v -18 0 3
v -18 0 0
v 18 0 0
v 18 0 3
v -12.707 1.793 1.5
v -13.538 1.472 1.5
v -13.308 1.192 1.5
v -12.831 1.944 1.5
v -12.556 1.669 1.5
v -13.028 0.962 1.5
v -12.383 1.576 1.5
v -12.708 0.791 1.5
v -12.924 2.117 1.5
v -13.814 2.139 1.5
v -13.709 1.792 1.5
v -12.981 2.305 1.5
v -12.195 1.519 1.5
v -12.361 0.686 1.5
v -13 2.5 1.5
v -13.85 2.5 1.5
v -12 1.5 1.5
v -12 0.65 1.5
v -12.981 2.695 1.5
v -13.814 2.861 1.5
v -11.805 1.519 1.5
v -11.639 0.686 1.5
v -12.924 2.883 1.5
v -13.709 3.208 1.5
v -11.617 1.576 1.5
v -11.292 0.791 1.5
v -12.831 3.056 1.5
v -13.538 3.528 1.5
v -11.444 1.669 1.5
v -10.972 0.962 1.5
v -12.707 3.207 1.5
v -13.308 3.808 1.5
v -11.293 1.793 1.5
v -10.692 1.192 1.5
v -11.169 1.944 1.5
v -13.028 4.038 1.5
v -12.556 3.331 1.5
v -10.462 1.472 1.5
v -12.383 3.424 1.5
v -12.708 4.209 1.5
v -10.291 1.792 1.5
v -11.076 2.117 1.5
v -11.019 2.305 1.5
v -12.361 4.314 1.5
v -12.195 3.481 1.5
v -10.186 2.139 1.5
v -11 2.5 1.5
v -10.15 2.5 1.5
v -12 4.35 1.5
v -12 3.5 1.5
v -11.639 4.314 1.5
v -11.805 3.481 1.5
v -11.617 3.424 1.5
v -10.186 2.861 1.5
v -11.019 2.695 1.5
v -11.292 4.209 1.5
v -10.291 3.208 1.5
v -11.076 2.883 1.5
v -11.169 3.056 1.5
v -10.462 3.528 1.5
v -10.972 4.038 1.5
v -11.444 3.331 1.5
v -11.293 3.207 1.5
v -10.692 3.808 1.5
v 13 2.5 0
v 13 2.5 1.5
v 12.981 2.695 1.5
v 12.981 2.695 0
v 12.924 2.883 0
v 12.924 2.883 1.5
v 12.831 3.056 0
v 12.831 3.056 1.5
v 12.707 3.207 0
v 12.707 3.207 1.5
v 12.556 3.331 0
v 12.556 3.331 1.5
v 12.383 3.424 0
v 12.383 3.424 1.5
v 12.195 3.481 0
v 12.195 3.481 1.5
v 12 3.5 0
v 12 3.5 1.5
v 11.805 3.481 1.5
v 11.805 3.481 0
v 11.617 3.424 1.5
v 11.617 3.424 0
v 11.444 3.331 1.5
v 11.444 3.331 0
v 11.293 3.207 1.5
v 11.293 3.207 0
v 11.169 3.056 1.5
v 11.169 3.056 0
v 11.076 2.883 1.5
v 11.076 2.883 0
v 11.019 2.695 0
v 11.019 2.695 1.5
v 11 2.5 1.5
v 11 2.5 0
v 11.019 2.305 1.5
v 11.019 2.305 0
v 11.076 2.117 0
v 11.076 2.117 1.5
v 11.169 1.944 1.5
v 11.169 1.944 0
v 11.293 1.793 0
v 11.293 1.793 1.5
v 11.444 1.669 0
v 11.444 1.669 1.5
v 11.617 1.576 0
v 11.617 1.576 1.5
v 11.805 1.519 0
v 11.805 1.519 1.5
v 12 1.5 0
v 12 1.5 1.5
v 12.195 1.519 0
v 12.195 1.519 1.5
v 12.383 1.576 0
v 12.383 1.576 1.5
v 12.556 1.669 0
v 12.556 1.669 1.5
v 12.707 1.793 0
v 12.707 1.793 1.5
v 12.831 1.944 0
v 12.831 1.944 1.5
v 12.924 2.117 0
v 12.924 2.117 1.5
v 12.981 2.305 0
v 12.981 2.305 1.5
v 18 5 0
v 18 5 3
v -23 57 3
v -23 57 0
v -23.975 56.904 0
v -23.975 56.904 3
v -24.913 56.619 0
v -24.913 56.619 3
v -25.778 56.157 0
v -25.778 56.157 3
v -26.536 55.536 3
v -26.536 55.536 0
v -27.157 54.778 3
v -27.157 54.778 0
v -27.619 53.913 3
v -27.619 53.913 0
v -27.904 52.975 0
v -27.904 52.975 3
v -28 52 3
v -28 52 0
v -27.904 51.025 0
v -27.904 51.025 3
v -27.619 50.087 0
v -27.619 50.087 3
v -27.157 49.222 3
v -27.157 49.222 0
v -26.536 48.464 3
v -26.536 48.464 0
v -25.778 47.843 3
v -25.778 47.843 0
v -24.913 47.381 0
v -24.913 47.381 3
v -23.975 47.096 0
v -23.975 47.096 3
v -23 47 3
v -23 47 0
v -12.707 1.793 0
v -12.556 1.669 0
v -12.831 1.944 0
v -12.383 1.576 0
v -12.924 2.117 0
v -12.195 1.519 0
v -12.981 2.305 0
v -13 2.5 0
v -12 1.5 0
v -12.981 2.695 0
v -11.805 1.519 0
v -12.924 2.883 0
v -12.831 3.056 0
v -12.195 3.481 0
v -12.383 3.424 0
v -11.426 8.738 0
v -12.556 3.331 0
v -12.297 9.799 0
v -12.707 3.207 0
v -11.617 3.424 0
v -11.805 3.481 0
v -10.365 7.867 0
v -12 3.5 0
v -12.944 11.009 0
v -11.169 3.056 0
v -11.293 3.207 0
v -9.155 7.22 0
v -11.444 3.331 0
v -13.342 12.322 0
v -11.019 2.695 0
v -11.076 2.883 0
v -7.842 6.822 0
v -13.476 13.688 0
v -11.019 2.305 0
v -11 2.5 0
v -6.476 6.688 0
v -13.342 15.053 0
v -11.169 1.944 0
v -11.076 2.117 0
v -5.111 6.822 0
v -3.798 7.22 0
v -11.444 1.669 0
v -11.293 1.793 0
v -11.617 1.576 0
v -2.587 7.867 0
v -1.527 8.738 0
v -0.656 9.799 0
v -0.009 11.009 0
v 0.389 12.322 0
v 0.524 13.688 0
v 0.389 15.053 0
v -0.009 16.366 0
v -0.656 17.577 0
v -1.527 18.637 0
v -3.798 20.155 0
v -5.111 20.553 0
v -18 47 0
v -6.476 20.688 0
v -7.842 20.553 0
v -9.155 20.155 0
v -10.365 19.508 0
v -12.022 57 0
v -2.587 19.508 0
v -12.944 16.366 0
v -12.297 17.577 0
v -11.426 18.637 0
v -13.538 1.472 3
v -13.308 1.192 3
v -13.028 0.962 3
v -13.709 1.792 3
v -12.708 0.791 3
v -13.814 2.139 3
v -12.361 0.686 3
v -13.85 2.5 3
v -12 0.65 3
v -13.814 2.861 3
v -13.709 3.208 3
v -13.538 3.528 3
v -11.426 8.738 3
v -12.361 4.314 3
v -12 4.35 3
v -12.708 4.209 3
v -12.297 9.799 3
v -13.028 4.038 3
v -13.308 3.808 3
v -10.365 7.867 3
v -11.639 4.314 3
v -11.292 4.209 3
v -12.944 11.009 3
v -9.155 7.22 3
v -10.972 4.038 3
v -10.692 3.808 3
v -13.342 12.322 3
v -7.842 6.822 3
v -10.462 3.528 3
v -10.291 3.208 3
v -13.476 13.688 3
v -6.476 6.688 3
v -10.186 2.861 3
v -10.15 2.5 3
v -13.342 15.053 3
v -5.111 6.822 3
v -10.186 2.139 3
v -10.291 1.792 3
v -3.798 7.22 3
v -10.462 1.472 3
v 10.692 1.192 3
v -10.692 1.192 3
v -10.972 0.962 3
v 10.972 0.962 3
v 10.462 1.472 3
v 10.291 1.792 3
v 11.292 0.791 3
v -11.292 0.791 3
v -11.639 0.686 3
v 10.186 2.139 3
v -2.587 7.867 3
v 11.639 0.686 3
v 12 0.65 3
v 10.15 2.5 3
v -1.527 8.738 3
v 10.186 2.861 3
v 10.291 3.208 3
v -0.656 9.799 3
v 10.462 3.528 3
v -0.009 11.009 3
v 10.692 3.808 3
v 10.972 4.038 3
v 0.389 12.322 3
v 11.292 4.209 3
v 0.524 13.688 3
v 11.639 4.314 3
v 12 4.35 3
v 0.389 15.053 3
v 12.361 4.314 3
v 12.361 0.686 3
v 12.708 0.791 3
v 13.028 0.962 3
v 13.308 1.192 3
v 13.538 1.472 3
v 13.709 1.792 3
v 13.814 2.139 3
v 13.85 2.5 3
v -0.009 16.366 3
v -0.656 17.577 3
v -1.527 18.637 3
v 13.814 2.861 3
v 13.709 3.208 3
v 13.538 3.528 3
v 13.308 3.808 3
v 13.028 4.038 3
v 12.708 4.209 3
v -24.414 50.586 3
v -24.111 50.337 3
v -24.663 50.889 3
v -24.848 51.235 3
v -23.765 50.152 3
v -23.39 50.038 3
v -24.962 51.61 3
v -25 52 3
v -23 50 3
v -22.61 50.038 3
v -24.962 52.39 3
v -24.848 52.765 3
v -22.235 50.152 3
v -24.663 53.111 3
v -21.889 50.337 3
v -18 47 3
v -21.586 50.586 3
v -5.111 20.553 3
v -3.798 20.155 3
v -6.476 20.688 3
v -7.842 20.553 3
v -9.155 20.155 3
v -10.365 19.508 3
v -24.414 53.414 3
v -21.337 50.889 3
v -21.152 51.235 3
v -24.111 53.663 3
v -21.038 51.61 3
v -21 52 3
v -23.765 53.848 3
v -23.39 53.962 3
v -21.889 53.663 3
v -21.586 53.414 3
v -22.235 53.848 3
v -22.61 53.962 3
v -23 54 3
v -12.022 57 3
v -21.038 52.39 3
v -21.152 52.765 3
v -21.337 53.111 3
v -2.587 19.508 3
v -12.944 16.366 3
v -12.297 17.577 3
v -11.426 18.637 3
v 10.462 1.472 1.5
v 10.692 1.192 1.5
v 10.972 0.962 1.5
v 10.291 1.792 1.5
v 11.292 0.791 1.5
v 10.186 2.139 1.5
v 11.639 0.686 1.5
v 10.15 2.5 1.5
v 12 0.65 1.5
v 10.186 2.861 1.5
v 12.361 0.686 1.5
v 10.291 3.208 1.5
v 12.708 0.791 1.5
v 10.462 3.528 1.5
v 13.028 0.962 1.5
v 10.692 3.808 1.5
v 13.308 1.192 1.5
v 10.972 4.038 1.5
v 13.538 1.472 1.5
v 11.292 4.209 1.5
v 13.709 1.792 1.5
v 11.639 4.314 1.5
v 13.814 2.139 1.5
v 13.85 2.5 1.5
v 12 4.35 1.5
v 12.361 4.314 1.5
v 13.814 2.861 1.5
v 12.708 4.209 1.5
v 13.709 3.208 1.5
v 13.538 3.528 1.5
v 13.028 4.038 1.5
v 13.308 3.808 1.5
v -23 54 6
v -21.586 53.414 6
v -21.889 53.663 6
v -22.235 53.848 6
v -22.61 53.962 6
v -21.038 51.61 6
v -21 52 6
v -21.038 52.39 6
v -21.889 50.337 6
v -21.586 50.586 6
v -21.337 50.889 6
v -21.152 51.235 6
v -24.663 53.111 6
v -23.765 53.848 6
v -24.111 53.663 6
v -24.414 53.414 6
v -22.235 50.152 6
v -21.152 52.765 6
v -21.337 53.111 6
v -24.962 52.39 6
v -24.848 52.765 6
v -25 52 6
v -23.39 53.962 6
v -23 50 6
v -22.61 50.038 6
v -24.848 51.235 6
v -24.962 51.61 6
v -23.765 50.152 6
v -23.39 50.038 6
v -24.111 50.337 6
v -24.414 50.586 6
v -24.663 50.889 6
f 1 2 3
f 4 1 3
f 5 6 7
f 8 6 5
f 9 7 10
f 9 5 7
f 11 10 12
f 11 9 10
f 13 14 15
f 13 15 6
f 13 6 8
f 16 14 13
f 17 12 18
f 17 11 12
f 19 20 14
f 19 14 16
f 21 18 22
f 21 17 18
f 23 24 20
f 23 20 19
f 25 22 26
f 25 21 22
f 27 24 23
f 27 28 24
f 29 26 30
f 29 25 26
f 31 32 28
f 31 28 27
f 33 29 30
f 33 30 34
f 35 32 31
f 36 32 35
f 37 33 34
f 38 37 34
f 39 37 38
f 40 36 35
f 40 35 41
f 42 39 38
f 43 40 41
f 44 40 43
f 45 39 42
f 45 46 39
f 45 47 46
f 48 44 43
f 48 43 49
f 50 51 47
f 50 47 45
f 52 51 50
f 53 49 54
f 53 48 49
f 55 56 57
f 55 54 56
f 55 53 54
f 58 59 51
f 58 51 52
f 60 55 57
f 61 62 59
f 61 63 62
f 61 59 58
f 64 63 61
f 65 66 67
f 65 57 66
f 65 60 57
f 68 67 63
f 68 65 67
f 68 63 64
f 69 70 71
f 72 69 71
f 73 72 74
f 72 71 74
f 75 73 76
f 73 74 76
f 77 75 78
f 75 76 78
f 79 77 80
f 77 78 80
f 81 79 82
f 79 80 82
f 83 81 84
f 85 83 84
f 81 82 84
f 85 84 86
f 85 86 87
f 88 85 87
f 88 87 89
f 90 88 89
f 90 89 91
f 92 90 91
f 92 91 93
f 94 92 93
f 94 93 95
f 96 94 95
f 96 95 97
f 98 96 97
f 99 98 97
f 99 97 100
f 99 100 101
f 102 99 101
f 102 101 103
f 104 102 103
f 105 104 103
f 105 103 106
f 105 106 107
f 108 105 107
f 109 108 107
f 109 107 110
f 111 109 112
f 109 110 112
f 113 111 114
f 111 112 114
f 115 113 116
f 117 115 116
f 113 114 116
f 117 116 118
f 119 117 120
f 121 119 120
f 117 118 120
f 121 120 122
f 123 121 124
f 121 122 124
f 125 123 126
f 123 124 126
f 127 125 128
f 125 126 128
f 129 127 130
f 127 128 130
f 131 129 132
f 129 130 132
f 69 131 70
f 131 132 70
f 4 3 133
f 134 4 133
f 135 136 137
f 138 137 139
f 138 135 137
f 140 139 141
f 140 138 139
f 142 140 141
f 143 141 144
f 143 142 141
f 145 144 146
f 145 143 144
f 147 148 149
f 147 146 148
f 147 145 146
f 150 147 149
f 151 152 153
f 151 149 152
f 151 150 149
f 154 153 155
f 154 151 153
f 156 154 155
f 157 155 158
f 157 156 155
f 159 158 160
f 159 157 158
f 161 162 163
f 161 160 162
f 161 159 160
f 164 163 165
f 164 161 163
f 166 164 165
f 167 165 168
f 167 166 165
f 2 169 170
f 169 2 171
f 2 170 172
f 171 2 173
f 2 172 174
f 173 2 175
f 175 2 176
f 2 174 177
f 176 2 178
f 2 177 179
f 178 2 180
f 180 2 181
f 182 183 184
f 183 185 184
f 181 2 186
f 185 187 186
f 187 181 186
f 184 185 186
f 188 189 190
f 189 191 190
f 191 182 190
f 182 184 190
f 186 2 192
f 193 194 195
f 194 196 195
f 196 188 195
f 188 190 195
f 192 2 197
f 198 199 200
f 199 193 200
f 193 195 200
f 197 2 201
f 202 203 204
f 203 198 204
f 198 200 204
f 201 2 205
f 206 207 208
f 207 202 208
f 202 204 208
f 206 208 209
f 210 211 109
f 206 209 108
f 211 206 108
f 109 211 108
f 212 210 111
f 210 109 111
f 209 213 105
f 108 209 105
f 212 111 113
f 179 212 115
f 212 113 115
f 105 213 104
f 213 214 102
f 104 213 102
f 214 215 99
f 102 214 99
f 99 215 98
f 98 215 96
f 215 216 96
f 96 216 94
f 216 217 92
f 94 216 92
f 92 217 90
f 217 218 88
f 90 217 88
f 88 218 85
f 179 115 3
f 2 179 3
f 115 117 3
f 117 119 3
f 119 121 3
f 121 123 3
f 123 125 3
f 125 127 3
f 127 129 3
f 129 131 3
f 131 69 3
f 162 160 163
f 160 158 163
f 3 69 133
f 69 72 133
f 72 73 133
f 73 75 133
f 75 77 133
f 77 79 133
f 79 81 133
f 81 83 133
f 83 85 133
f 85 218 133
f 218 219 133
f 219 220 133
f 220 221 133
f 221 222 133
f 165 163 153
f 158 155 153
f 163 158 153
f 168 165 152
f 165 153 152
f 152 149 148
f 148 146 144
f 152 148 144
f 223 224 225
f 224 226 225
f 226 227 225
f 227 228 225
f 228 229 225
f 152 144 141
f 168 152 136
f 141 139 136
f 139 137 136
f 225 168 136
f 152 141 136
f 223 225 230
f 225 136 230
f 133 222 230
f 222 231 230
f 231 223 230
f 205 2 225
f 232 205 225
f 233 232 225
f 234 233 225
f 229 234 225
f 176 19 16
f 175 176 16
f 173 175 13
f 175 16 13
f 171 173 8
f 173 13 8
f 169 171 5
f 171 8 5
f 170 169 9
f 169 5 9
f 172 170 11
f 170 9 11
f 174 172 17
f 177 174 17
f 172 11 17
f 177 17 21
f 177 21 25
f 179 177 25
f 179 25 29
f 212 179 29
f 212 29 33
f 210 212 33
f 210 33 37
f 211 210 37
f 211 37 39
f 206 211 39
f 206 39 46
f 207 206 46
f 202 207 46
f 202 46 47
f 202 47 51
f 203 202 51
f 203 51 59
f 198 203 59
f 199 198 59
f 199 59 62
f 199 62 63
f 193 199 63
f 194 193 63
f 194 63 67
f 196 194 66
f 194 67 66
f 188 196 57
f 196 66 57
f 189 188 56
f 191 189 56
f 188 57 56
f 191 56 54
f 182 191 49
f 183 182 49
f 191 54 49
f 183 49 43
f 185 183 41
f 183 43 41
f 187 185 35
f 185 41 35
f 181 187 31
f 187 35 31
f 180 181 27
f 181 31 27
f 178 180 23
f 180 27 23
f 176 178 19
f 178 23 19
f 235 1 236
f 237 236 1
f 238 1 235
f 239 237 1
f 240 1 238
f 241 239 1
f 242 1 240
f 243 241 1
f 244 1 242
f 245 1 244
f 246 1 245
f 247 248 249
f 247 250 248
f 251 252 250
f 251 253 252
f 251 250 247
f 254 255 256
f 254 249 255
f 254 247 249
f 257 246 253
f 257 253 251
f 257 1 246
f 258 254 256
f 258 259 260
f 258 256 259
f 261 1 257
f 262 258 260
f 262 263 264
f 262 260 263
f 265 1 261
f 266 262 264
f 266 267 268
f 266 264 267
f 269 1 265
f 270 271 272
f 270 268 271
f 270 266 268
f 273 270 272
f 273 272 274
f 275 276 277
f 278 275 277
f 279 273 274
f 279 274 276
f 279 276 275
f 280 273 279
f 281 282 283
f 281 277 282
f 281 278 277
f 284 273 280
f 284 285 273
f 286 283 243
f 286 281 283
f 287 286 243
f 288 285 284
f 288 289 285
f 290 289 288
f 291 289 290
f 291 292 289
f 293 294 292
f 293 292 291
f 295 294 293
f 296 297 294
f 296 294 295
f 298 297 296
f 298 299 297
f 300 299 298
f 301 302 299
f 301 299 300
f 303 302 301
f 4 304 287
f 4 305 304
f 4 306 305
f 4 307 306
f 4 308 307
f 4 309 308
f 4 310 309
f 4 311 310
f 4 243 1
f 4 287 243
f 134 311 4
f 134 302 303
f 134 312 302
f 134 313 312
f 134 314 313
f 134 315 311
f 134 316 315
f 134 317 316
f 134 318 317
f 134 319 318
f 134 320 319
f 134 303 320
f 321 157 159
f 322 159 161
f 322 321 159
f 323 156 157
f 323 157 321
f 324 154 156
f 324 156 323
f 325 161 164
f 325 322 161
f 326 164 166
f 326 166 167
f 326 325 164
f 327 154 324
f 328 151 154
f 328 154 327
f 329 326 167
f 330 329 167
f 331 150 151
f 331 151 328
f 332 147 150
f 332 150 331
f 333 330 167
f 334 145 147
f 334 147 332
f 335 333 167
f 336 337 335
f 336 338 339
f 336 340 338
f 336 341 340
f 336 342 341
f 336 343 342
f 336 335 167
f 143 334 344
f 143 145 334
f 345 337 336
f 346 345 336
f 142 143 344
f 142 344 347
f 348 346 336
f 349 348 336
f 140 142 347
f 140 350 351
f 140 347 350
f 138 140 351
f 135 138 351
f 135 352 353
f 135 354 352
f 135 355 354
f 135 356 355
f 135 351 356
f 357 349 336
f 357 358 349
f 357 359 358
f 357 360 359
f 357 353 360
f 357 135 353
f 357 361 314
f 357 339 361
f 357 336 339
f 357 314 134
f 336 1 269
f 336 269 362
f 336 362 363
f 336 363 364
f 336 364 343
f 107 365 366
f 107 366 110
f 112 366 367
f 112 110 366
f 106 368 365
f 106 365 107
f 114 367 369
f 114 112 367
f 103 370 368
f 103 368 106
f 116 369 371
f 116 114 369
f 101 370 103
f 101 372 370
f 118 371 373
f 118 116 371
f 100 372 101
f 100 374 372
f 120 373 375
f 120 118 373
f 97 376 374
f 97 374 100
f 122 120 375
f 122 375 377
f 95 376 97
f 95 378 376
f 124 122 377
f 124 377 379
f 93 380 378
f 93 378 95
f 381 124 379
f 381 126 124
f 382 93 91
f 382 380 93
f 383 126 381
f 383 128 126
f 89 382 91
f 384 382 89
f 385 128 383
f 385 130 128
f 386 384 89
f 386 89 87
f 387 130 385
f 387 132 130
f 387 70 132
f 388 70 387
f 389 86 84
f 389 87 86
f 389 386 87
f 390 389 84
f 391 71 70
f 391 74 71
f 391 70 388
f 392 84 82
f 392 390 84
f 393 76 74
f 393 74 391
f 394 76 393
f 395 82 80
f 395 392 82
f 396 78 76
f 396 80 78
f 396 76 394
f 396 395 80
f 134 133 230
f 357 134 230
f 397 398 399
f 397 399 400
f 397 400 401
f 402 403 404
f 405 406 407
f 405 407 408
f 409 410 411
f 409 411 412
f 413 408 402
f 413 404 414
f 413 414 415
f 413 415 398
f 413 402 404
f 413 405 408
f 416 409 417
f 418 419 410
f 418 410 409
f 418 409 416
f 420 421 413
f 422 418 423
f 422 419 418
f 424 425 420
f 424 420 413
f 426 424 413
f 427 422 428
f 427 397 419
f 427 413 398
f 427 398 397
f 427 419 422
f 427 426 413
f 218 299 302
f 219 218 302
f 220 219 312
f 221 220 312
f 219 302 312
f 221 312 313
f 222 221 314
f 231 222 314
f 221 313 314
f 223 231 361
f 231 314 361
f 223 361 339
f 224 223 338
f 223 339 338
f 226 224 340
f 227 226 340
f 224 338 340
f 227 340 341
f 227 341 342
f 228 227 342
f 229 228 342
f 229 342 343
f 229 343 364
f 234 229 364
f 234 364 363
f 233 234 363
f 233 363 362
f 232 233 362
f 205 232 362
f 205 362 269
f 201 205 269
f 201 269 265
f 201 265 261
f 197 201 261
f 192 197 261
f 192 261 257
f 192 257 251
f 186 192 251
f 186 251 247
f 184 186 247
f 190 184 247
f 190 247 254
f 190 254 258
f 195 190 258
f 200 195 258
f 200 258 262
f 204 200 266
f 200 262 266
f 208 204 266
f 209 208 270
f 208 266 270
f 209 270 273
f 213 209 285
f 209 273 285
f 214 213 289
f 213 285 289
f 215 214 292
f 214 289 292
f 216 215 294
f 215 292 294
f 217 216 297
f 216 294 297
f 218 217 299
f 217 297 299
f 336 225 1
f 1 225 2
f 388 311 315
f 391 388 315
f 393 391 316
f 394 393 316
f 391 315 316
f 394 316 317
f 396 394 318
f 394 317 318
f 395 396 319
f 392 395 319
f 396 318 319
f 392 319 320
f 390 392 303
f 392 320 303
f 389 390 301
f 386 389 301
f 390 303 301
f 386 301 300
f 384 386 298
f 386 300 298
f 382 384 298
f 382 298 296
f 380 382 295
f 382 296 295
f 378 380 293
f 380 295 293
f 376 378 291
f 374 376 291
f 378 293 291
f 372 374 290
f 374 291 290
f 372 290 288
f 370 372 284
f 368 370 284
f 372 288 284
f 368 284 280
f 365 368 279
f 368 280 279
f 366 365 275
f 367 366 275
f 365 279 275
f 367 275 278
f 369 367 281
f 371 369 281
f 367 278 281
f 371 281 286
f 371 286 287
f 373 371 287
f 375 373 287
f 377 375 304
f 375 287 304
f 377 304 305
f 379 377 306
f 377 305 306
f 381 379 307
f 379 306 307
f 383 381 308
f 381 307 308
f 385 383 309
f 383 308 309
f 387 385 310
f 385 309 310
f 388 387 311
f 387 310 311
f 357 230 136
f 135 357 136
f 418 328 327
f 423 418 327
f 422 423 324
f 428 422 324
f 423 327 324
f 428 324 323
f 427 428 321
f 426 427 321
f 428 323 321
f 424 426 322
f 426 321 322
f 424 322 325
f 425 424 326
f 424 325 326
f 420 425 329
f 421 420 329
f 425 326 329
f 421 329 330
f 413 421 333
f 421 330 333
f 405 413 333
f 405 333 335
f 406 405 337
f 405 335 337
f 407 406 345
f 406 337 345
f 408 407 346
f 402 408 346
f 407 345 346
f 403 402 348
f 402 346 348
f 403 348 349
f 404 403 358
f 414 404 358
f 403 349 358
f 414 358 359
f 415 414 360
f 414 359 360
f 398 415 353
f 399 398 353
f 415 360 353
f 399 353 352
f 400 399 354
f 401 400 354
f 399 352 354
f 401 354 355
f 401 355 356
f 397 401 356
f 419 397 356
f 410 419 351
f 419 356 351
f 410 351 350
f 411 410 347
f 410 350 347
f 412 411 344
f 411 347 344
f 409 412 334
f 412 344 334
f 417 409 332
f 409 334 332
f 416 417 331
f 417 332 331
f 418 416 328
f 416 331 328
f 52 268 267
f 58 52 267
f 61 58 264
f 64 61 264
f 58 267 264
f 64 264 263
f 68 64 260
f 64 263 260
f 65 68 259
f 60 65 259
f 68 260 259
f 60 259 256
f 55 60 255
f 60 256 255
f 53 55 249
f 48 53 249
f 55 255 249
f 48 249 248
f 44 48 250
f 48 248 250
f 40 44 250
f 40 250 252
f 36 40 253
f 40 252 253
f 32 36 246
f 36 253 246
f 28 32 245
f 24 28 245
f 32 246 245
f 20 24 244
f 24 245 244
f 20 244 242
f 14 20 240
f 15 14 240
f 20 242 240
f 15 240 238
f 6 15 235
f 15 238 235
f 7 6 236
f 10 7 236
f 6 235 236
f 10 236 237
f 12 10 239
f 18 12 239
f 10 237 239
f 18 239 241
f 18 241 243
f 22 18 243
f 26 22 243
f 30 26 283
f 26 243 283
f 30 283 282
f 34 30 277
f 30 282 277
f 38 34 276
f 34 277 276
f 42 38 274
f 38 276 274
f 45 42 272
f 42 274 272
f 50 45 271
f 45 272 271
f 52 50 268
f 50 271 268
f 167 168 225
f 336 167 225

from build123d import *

# Parameters (mm, degrees)
EXTRUDE_1_DEPTH     = 3
SKETCH_3_R          = 7
CUT_EXTRUDE_1_DEPTH = 64.576725301
SKETCH_4_R          = 1
CUT_EXTRUDE_2_DEPTH = 64.576725301
SKETCH_5_R          = 2
EXTRUDE_2_DEPTH     = 3
FILLET_1_RADIUS     = 5
FILLET_1_LENGTH     = 3
SKETCH_6_R          = 1.85
CUT_EXTRUDE_3_DEPTH = 1.5


with BuildPart() as part:
    # 草图1 → 凸台-拉伸1 (new body)
    with BuildSketch(Plane.XY):
        Polygon((-18, 0), (18, 0), (18, 5), (-12.022213998, 57), (-28, 57), (-28, 47), (-18, 47), align=None)
    extrude(amount=EXTRUDE_1_DEPTH)

    # 草图3 → 切除-拉伸1 (cut, through all)
    with BuildSketch(Plane.XY.offset(3)):
        with Locations((-6.476357534, 13.687539211)):
            Circle(SKETCH_3_R)
    extrude(amount=-CUT_EXTRUDE_1_DEPTH, mode=Mode.SUBTRACT)

    # 草图4 → 切除-拉伸2 (cut, through all)
    with BuildSketch(Plane.XY.offset(3)):
        with Locations((12, 2.5)):
            Circle(SKETCH_4_R)
        with Locations(Location((-12, 2.5, 0), (0, 0, 180))):
            Circle(SKETCH_4_R)
    extrude(amount=-CUT_EXTRUDE_2_DEPTH, mode=Mode.SUBTRACT)

    # 草图5 → 凸台-拉伸2 (add)
    with BuildSketch(Plane.XY.offset(3)):
        with Locations(Location((-23, 52, 0), (0, 0, 180))):
            Circle(SKETCH_5_R)
    extrude(amount=EXTRUDE_2_DEPTH)

    # 圆角1: full round fillet: the end face becomes a half cylinder, R = half its width
    fillet_1_face = Plane((-28, 52, 1.5), x_dir=(0, 0, 1), z_dir=(-1, 0, 0))  # on the end face: x along it, z out of the body
    fillet_1_slab = fillet_1_face.offset(-FILLET_1_RADIUS / 2) * Box(FILLET_1_LENGTH, 2 * FILLET_1_RADIUS, FILLET_1_RADIUS, mode=Mode.PRIVATE)  # the body's end, R deep
    fillet_1_round = Plane((-23, 52, 1.5), x_dir=(-1, 0, 0), z_dir=(0, 0, 1)) * Cylinder(FILLET_1_RADIUS, FILLET_1_LENGTH, mode=Mode.PRIVATE)  # its axis R under the face
    add(fillet_1_slab - fillet_1_round, mode=Mode.SUBTRACT)

    # 草图6 → 切除-拉伸3 (cut)
    with BuildSketch(Plane.XY.offset(3)):
        with Locations((12, 2.5)):
            Circle(SKETCH_6_R)
        with Locations((-12, 2.5)):
            Circle(SKETCH_6_R)
    extrude(amount=-CUT_EXTRUDE_3_DEPTH, mode=Mode.SUBTRACT)


solid = part.part
